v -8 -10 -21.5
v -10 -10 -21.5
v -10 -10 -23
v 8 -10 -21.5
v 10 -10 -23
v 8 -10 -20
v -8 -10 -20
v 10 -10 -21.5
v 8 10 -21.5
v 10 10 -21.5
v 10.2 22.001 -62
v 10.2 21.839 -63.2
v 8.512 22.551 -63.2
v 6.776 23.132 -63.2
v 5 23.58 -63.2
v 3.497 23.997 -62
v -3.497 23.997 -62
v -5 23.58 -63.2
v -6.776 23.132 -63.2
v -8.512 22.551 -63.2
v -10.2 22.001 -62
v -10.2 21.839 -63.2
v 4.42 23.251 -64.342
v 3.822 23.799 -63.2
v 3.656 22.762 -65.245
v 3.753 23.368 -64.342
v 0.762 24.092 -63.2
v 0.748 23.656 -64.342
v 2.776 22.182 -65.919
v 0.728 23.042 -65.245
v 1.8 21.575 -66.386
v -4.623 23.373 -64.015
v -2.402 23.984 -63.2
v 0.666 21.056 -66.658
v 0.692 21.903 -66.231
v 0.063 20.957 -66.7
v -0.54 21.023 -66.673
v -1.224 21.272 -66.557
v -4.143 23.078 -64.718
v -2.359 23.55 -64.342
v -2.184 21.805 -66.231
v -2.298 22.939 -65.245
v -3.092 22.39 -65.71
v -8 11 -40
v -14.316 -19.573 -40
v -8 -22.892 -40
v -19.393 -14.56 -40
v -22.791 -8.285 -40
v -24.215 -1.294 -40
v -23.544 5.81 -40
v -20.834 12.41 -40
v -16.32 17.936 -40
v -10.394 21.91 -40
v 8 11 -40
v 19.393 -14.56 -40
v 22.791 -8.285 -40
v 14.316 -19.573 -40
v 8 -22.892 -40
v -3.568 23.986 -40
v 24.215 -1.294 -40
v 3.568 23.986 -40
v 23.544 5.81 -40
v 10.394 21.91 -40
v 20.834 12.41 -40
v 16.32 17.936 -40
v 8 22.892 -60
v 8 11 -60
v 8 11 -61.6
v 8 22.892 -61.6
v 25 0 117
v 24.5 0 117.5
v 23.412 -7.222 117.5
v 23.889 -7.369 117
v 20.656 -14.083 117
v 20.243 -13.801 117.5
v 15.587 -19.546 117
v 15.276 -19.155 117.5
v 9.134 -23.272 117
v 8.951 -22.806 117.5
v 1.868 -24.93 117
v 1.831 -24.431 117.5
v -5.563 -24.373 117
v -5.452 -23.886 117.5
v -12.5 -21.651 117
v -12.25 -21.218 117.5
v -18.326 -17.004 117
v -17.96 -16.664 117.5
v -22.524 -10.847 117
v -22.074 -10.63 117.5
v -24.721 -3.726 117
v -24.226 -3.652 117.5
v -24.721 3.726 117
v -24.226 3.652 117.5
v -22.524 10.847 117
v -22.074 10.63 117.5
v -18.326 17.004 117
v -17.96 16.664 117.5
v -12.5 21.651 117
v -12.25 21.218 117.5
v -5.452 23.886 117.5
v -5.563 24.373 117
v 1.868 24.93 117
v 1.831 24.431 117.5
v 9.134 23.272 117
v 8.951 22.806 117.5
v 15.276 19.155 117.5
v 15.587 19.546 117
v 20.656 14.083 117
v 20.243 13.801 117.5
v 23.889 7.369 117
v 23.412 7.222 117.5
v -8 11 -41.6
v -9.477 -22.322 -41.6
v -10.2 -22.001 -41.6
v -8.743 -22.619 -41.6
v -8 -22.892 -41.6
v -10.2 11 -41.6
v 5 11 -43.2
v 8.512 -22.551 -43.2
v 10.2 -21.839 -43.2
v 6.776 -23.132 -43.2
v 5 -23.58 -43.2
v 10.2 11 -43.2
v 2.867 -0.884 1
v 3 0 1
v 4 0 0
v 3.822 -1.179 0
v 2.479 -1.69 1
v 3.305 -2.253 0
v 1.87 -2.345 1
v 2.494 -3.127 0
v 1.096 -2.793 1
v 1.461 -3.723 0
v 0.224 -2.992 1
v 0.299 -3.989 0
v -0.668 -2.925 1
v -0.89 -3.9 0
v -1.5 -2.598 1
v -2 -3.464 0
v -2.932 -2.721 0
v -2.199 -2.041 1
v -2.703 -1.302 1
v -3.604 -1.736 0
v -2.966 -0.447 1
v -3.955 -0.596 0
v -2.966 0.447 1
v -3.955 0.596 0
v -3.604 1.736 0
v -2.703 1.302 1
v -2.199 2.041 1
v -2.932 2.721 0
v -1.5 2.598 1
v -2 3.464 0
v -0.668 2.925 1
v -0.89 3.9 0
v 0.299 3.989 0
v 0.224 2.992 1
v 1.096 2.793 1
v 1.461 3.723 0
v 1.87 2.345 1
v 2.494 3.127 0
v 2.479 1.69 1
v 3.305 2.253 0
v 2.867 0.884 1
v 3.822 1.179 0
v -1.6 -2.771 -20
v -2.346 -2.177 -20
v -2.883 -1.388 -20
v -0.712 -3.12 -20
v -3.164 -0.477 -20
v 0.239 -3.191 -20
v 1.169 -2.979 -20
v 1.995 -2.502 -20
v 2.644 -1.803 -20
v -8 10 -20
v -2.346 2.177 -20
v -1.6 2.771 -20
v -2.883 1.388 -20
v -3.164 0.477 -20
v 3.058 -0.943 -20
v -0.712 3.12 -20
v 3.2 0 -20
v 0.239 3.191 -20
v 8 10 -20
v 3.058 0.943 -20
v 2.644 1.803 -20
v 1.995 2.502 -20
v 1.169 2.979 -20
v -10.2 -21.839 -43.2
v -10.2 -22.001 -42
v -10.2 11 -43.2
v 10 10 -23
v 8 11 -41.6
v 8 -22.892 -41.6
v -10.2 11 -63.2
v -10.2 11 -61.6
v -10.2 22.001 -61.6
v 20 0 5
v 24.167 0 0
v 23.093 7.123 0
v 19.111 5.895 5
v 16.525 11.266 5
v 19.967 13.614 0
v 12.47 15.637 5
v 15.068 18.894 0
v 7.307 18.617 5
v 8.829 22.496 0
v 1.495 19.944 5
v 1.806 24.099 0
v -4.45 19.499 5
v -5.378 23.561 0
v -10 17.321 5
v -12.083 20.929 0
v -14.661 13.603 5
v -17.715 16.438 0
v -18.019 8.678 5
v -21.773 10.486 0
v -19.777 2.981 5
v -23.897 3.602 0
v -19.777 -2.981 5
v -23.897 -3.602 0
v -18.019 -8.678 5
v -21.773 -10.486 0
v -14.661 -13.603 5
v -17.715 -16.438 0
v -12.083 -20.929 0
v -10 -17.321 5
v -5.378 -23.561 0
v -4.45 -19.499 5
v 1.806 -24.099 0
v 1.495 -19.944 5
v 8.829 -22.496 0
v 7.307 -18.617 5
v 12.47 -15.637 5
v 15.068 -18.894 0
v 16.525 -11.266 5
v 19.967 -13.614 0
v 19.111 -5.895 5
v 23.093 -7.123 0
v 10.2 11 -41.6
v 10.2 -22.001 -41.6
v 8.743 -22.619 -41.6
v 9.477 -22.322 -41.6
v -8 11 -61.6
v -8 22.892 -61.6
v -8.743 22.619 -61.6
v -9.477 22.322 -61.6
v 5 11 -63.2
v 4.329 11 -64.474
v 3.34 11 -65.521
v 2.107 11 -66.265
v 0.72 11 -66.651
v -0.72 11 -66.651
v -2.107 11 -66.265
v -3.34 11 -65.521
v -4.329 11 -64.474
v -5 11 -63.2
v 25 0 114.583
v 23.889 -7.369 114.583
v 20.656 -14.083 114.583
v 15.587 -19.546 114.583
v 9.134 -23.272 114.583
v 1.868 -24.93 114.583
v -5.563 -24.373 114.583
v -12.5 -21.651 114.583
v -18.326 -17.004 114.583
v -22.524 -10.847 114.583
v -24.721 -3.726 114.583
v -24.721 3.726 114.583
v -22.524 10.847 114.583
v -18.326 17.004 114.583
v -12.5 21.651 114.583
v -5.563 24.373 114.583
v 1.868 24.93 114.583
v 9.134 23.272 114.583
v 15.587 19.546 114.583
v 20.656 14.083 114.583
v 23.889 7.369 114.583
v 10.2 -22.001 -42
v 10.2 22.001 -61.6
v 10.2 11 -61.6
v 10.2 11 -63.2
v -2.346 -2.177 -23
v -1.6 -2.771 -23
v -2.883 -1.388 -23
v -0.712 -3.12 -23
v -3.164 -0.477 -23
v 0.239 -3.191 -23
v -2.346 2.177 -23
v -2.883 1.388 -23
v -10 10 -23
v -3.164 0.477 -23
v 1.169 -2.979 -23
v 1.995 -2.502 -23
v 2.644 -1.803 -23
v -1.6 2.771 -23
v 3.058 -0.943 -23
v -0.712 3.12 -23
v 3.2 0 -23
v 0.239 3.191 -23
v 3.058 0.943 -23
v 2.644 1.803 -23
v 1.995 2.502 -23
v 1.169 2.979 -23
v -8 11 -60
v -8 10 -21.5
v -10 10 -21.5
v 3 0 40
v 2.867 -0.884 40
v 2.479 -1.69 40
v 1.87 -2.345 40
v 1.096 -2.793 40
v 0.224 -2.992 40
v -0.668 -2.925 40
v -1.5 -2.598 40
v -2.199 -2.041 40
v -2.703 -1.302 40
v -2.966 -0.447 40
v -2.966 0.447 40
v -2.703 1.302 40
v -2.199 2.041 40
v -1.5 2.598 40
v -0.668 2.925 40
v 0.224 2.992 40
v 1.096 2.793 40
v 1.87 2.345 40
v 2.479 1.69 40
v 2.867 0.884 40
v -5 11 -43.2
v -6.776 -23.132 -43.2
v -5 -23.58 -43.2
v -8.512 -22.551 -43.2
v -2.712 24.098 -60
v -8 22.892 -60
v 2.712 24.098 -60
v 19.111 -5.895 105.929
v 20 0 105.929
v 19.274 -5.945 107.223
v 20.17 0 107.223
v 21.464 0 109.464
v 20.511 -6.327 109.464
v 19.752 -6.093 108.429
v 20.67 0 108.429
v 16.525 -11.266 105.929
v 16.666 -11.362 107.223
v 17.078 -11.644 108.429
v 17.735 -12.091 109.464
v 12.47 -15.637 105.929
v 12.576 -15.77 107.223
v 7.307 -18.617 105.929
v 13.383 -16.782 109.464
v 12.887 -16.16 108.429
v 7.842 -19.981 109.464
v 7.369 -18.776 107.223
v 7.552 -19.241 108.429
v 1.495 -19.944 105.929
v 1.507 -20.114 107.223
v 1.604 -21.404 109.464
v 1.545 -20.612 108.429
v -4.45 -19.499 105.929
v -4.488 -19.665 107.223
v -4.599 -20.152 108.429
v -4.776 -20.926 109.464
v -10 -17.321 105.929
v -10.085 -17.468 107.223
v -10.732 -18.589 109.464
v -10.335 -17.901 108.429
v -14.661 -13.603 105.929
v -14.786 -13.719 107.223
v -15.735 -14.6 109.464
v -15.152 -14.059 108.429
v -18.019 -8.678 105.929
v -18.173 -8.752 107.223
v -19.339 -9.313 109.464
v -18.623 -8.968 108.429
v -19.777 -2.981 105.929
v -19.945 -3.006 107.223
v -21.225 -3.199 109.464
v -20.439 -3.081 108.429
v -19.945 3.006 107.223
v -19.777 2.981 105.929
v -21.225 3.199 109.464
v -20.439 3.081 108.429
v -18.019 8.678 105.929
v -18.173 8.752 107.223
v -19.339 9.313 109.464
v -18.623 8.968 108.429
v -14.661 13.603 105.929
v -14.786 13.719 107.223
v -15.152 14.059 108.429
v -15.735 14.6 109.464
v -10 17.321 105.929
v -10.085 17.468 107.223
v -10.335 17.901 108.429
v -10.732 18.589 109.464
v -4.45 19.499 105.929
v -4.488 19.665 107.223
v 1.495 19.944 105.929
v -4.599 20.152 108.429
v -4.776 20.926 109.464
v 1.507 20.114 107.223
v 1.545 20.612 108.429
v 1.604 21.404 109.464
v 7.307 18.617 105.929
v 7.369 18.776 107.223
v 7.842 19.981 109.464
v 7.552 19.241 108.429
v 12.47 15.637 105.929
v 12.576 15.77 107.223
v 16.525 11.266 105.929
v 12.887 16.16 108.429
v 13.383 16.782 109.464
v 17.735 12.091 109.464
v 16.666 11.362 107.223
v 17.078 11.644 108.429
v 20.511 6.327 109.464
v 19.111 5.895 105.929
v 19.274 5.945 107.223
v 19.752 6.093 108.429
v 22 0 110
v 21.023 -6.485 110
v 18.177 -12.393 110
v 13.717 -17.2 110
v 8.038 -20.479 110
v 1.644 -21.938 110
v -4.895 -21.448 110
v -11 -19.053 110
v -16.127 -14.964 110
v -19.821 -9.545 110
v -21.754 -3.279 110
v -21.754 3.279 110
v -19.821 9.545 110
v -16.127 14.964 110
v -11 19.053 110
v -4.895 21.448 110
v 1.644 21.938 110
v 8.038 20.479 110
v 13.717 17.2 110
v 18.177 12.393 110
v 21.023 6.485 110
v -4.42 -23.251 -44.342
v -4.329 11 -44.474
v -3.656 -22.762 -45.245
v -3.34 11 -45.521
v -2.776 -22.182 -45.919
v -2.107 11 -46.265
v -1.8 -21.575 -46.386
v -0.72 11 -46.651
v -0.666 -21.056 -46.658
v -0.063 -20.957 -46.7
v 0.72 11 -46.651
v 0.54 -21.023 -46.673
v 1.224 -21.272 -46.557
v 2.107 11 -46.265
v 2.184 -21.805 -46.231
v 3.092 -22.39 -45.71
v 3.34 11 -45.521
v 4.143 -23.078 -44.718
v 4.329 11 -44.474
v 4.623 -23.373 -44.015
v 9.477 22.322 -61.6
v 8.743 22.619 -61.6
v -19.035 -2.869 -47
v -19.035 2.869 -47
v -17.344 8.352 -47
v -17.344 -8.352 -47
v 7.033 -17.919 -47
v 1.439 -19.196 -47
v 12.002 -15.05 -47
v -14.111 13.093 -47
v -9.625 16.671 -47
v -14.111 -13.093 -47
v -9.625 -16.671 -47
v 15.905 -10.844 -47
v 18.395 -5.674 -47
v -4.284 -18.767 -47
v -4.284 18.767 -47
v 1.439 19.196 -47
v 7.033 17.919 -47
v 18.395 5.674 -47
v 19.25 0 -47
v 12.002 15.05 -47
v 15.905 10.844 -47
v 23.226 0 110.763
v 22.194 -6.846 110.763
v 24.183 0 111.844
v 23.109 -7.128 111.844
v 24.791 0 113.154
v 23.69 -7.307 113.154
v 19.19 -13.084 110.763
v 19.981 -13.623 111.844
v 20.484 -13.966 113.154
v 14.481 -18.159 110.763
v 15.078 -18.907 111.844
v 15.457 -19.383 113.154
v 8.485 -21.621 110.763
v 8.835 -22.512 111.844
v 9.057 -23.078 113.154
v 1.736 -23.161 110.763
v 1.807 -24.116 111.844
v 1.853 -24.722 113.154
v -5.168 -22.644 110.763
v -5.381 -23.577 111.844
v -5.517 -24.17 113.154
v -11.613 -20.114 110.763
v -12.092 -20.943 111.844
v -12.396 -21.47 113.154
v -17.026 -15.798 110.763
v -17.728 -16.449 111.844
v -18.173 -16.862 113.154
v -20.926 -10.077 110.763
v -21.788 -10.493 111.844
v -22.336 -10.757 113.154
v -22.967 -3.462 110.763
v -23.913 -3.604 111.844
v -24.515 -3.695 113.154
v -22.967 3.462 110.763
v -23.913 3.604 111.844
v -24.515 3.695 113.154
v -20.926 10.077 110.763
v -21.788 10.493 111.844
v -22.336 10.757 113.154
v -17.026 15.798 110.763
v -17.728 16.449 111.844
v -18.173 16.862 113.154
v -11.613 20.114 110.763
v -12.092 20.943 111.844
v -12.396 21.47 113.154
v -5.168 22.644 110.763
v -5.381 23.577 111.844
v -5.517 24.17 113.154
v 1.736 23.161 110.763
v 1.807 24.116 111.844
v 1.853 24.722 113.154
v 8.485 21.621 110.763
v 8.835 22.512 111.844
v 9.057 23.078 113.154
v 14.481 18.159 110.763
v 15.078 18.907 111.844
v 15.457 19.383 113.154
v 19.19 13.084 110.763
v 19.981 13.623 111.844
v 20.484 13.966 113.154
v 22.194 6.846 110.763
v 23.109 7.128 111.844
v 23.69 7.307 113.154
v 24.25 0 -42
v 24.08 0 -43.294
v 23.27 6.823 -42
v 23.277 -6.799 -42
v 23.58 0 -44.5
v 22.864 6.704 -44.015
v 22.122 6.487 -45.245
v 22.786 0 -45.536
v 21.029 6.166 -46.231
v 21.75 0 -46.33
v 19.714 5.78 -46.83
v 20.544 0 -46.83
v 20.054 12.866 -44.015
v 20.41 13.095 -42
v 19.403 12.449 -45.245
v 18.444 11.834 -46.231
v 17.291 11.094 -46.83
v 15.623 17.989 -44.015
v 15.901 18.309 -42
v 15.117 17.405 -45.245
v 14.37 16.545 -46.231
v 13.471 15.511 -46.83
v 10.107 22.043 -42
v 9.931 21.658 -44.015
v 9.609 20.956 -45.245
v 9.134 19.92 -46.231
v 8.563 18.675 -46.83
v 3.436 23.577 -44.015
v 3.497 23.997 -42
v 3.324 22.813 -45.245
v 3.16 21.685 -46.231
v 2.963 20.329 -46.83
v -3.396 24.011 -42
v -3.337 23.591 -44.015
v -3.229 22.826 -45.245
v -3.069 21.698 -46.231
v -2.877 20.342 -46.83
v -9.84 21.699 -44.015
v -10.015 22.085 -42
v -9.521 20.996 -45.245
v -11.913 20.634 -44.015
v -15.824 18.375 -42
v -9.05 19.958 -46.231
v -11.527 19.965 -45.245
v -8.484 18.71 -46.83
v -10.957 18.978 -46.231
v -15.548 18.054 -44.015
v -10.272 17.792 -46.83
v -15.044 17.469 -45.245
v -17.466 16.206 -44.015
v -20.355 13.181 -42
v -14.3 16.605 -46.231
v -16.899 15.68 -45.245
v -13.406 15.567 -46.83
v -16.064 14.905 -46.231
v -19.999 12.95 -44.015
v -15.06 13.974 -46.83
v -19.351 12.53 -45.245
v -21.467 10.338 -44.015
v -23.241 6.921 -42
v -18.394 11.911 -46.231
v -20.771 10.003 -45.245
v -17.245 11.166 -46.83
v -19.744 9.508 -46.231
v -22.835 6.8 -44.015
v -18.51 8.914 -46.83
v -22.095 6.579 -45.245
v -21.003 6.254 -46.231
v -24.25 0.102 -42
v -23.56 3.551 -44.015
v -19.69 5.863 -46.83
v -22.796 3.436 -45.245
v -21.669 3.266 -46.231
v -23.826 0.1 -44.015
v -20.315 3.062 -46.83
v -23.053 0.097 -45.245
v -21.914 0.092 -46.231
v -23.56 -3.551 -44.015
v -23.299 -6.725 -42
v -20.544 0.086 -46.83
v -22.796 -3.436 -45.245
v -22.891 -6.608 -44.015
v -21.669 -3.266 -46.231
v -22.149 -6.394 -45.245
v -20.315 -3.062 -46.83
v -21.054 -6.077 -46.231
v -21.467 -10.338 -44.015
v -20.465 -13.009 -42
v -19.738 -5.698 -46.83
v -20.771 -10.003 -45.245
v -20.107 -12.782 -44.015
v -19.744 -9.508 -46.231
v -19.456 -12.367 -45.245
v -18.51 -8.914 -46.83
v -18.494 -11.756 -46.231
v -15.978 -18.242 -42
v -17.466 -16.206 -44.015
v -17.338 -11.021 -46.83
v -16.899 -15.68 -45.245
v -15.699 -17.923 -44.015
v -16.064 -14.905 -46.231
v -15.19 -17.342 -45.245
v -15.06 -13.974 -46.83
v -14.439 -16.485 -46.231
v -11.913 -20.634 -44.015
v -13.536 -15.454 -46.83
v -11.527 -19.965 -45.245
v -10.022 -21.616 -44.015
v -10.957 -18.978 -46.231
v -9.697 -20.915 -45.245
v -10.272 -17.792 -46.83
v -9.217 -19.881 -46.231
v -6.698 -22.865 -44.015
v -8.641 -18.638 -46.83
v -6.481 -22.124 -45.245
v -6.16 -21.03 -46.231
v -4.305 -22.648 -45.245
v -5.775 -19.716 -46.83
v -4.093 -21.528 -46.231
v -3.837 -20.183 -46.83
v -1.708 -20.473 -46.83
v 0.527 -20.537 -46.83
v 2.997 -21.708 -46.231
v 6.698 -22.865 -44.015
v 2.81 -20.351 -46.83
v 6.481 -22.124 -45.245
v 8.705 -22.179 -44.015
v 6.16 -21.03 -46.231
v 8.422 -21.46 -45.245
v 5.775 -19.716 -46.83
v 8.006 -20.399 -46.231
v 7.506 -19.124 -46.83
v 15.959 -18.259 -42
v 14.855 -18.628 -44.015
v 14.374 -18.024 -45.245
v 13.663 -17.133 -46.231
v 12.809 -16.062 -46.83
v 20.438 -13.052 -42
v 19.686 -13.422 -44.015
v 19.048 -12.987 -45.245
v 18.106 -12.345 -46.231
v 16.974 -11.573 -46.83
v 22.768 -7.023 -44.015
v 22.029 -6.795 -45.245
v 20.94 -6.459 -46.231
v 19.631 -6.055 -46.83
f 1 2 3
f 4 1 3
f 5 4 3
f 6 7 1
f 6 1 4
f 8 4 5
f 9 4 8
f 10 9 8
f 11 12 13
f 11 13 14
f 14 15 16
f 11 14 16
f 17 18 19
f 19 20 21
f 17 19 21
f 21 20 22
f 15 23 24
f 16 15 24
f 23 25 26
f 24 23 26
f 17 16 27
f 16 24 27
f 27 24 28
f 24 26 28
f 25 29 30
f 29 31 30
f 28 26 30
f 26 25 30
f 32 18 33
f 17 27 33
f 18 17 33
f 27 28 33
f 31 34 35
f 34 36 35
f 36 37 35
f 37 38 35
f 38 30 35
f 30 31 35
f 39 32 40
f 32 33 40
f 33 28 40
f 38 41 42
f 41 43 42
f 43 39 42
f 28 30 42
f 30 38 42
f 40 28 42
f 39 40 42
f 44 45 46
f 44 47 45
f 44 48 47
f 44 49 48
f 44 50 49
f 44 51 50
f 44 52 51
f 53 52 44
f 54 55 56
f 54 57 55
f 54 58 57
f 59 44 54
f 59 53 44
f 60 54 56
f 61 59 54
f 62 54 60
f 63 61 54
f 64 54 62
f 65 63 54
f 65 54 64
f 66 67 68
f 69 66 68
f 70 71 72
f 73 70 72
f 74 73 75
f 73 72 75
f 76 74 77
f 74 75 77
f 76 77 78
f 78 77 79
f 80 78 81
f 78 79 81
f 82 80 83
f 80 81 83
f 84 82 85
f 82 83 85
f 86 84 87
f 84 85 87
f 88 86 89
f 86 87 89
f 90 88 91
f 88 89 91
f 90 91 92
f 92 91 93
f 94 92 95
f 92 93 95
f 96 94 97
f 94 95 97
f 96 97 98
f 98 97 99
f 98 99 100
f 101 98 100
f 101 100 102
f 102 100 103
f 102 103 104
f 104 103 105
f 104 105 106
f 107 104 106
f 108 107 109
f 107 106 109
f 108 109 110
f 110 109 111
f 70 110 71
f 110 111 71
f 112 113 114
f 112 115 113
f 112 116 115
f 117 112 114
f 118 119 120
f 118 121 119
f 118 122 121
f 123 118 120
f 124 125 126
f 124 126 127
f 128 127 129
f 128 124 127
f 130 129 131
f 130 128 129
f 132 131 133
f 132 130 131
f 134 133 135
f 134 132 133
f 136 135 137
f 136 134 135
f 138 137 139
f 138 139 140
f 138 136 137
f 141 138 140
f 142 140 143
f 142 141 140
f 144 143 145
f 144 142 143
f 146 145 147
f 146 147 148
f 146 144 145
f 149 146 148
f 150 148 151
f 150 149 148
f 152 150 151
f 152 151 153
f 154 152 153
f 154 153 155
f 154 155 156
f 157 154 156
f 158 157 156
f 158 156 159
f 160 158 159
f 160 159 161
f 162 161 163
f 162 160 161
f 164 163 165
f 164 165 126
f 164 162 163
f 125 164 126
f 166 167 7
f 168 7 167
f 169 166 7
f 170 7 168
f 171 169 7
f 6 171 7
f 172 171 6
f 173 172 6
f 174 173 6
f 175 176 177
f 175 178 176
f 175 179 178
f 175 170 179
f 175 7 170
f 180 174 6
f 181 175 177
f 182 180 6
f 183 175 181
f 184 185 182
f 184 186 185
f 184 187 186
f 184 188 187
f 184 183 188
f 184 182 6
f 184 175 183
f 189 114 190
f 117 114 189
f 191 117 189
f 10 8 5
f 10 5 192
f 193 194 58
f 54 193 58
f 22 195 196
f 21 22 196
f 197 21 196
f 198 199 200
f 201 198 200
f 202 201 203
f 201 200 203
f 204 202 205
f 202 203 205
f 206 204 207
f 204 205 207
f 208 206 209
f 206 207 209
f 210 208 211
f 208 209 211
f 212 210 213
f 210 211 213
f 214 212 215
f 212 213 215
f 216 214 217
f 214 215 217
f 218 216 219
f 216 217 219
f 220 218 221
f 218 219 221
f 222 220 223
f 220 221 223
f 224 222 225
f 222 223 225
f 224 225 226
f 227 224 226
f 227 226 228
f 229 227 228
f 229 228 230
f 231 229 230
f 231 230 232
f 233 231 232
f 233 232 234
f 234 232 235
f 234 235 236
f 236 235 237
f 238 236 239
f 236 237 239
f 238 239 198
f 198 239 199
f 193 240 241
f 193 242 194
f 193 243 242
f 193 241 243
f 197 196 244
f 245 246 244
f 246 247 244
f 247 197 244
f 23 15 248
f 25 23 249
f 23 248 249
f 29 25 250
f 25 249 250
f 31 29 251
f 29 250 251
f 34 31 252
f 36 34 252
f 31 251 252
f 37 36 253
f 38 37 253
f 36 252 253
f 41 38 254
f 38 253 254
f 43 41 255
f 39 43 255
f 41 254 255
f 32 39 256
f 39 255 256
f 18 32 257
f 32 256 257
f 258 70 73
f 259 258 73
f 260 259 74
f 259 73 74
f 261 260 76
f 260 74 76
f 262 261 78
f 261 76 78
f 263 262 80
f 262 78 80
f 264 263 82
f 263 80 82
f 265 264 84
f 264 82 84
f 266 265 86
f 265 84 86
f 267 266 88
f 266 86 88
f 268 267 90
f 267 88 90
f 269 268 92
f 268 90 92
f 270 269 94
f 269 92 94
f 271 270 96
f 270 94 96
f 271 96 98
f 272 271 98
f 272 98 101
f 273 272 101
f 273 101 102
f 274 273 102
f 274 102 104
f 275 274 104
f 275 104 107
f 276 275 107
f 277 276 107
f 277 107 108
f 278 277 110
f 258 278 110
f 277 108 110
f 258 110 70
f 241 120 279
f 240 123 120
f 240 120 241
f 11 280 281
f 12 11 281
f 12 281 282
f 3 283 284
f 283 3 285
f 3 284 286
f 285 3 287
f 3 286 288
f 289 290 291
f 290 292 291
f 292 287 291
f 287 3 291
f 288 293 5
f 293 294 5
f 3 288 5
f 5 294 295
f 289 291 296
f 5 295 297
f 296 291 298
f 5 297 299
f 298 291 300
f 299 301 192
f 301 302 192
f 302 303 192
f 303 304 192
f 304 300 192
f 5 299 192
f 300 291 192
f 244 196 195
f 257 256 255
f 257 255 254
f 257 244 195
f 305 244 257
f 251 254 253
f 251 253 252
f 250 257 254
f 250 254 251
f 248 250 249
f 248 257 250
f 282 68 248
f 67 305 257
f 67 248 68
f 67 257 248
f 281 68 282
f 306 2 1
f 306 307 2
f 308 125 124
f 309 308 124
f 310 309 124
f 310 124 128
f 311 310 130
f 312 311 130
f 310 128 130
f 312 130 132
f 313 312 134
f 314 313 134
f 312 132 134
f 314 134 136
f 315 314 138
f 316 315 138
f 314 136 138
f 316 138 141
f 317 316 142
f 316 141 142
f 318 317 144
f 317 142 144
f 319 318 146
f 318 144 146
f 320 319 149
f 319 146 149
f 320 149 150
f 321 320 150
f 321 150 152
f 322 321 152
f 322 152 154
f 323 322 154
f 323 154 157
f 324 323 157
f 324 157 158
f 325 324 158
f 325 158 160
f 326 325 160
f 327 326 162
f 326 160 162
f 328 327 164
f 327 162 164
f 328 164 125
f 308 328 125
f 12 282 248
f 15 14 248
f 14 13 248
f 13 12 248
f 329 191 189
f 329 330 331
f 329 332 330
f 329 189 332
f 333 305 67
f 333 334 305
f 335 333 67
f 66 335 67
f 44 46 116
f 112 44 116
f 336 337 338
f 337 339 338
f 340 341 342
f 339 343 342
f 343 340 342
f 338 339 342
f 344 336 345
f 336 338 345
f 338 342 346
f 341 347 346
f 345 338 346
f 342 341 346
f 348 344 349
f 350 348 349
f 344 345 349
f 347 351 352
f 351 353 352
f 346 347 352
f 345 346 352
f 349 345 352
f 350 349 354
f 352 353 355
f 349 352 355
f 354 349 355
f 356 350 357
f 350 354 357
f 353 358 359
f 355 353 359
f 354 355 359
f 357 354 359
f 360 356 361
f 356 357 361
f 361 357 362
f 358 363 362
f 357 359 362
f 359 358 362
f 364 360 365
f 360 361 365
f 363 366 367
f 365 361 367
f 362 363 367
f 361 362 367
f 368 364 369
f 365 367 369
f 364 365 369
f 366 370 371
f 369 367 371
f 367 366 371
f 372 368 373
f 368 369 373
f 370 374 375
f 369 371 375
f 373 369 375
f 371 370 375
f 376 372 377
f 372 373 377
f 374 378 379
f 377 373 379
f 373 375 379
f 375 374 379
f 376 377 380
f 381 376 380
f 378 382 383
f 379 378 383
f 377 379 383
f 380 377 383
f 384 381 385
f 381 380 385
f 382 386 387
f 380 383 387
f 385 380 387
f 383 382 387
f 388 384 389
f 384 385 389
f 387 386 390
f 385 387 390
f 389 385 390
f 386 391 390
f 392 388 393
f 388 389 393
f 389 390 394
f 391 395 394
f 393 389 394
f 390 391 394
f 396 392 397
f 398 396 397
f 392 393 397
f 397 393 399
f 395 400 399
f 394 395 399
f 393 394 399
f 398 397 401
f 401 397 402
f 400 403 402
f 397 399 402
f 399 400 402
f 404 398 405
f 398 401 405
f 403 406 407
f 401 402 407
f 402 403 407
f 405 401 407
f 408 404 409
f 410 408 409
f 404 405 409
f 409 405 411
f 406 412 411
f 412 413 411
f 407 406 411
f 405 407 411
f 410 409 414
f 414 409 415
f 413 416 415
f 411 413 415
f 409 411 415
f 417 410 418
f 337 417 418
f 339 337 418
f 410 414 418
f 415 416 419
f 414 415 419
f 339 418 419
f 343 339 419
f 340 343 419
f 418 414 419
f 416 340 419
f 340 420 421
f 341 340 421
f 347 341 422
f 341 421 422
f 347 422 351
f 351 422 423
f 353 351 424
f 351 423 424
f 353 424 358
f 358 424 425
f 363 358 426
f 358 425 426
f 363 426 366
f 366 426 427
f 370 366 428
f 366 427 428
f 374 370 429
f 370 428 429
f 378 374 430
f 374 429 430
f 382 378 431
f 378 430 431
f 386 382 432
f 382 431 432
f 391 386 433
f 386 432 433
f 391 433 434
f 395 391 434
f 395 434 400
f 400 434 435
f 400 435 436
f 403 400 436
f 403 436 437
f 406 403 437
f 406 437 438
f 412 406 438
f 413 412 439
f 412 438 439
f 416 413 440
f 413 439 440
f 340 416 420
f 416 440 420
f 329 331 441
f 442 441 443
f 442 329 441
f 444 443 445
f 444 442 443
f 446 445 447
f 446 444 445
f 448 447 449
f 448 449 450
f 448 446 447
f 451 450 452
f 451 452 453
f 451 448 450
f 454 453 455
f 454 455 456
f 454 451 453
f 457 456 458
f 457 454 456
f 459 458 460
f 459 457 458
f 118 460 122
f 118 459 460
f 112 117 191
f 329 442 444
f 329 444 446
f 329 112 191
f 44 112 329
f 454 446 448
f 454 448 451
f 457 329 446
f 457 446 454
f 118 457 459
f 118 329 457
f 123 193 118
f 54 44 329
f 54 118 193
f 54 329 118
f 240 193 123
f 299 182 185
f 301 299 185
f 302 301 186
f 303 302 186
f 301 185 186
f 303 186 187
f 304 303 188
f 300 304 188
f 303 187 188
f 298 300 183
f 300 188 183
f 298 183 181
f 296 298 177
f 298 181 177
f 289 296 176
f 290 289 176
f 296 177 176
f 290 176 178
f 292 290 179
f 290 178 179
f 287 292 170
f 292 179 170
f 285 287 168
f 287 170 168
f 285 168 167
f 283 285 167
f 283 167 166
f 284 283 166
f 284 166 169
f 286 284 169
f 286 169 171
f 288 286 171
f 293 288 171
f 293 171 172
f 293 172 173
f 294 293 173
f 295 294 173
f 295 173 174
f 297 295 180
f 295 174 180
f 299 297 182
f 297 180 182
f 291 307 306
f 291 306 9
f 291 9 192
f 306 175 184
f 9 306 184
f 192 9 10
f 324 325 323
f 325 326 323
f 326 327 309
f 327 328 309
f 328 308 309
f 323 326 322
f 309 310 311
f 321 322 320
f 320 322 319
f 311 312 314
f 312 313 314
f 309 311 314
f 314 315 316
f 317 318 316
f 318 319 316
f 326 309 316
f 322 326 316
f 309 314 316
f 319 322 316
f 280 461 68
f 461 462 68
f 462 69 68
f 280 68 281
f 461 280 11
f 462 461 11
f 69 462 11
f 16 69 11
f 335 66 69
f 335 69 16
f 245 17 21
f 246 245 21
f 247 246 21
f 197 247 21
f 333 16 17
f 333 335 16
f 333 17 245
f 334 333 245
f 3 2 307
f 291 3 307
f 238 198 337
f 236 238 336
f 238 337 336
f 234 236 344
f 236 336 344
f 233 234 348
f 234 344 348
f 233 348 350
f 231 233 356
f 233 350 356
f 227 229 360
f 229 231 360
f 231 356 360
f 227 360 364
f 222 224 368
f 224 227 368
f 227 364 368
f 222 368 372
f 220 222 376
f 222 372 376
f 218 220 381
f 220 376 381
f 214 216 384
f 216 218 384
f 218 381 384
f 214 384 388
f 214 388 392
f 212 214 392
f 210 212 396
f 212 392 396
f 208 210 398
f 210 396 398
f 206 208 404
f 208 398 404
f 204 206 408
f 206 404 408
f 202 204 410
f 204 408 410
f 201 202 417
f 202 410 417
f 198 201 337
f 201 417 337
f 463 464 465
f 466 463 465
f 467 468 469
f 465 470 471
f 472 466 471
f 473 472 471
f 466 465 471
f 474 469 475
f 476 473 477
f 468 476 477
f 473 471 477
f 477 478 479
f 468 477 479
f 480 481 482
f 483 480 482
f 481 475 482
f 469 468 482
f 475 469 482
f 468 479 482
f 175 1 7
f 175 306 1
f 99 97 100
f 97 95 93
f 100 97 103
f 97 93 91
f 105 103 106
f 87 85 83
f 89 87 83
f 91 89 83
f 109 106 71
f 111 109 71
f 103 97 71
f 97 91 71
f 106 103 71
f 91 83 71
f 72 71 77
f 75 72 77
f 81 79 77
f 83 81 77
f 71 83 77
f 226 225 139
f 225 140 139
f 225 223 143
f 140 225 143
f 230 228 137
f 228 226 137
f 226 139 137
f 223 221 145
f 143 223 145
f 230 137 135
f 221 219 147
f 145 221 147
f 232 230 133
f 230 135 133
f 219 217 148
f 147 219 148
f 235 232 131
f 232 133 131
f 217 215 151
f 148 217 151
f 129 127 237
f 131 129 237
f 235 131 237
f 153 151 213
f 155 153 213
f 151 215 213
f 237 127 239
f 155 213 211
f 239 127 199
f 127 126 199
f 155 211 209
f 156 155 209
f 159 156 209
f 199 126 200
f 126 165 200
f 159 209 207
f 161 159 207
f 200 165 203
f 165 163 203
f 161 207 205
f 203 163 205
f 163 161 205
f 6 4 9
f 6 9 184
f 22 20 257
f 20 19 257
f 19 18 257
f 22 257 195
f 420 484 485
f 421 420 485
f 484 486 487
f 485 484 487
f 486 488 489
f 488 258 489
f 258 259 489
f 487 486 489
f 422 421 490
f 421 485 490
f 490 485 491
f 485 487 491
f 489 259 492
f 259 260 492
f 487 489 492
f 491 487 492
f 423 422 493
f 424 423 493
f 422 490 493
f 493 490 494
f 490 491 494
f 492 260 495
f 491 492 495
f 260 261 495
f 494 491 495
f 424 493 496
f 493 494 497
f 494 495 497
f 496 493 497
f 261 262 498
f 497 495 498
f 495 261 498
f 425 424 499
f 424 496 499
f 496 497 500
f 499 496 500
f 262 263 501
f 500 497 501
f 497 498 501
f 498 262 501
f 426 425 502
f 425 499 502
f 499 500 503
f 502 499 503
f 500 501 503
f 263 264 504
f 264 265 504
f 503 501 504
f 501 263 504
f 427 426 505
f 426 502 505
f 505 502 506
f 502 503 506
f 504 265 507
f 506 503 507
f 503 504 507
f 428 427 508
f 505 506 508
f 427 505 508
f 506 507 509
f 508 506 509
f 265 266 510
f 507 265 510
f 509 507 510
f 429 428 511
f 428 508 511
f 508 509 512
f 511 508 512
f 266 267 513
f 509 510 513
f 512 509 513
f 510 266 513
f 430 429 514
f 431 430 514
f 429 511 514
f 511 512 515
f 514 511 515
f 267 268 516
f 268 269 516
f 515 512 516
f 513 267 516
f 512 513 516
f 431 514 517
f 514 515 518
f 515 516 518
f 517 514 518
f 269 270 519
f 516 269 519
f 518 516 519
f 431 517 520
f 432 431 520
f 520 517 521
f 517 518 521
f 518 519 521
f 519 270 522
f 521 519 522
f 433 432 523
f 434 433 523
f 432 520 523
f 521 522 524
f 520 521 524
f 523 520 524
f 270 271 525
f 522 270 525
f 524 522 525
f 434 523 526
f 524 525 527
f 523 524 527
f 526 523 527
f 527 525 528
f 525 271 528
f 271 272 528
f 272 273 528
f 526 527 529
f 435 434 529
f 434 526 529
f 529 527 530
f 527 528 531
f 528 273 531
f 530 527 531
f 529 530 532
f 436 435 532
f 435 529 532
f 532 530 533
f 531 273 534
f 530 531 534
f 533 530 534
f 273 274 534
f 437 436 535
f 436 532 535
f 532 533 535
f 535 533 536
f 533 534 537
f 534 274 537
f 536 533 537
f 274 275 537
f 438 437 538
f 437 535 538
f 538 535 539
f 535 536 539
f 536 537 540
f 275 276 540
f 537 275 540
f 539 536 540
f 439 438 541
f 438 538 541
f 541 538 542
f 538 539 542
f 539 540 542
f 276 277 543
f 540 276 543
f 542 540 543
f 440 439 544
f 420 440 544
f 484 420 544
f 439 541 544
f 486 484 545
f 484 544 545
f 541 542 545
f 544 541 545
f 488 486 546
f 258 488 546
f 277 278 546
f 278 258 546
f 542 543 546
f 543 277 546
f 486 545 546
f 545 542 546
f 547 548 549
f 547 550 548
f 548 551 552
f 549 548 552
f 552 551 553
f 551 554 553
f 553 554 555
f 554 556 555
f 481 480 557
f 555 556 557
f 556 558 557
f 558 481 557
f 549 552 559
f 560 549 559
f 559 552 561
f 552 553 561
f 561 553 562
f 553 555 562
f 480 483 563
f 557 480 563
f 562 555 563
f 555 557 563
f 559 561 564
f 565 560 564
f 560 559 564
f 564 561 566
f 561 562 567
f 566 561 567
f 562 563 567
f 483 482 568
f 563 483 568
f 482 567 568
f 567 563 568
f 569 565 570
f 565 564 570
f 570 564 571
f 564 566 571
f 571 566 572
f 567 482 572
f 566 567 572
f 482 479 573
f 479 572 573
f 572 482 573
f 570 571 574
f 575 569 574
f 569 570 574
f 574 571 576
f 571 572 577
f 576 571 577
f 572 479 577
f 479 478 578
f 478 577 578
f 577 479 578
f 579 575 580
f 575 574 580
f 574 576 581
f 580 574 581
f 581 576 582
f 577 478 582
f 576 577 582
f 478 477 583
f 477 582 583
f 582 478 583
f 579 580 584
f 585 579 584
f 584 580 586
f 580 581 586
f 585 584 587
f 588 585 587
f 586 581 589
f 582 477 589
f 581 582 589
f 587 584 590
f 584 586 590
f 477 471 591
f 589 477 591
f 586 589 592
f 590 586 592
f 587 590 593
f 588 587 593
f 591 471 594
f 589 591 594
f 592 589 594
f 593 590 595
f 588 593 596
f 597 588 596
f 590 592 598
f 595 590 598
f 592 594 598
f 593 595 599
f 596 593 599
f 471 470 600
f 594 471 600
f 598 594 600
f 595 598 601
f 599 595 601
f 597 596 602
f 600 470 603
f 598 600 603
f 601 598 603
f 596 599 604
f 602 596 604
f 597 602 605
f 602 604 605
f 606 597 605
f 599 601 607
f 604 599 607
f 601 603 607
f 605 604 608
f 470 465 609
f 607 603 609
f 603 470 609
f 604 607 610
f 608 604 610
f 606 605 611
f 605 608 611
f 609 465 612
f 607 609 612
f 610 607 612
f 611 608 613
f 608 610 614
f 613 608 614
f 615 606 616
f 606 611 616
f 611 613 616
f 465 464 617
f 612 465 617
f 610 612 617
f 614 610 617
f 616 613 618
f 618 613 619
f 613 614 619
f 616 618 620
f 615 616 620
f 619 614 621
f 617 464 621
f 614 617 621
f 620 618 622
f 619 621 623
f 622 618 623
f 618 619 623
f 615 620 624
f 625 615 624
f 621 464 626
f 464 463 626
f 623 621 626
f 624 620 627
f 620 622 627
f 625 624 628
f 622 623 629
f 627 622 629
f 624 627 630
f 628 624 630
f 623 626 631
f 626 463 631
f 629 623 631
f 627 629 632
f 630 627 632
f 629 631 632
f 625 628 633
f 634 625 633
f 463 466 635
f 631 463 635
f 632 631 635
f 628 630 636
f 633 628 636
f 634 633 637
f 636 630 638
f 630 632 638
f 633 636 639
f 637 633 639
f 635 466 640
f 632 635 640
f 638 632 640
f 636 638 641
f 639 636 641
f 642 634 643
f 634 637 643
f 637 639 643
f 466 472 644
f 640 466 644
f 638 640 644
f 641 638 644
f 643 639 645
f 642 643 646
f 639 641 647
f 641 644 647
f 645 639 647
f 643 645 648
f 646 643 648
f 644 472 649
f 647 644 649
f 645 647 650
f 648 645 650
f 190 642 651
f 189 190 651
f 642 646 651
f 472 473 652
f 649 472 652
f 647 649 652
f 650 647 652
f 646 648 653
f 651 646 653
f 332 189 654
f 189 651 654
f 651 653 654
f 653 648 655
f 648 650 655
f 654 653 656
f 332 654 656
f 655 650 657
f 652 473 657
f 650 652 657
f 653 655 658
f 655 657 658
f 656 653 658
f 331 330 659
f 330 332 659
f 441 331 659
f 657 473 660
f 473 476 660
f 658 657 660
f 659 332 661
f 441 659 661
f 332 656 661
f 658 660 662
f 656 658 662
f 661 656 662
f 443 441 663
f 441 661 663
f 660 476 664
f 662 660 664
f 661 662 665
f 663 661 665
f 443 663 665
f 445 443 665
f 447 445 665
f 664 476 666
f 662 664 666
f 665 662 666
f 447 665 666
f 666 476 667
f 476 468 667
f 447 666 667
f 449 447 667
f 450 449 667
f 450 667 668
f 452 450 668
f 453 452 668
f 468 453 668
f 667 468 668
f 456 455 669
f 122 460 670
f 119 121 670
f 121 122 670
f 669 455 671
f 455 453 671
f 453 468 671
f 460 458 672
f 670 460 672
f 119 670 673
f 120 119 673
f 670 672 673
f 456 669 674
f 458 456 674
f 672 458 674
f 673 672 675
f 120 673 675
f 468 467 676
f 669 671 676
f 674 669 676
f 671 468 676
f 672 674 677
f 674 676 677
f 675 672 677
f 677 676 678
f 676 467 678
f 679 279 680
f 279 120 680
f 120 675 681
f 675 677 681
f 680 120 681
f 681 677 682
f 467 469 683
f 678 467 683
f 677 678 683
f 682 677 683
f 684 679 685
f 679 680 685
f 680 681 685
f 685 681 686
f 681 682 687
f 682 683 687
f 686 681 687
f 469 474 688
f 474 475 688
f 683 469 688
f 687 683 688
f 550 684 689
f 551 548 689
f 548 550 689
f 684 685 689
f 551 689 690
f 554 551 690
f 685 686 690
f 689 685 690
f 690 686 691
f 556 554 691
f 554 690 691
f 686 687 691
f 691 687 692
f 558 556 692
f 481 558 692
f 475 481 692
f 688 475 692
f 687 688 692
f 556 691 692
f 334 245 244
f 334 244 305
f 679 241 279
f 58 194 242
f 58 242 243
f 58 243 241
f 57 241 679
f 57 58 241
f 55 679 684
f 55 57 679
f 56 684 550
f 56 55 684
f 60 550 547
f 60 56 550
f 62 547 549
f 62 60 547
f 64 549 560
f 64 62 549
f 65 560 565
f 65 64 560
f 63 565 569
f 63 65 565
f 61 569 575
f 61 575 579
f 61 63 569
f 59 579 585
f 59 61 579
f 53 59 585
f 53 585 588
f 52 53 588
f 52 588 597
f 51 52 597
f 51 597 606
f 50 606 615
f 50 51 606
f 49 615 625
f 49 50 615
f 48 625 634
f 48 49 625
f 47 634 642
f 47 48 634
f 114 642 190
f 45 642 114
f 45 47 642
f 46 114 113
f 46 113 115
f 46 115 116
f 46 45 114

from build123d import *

# Parameters (mm, degrees)
F2_SIZE     = 2
F4_SIZE     = 1
F5_SIZE     = 0.5
F6_R        = 25
F6_R_2      = 20
F7_DEPTH    = 5
F8_S5_R     = 20
F8_T6_DEPTH = 37
F10_W       = 20
F10_H       = 20
F10_R       = 3.2
F11_DEPTH   = 3
F12_W       = 2
F12_H       = 1.5
F13_DEPTH   = 10
F15_R       = 24.25
F16_DEPTH   = 7
F17_R       = 5
F19_DEPTH   = 25
F20_DEPTH   = 11
F23_DEPTH   = 50


# Not quite as in the source:
# - a fillet or chamfer that OpenCascade refuses, or shapes differently, is made with other operations: its cross-section is extruded or revolved along the edge and cut away or added


with BuildPart() as f1:
    # F0 (on Front) → F1 (revolve)
    with BuildSketch(Plane.XZ):
        Polygon((3, 40), (3, 0), (20, 0), (20, 110), (25, 110), (25, 117.5), (0, 117.5), (0, 40), align=None)
    revolve(axis=Axis((0, 0, 78.75), (0, 0, -1)))

    # F2
    f2_edges = [f1.edges().sort_by_distance(p)[0] for p in [
        (-20, 0, 110),
    ]]
    chamfer(f2_edges, length=F2_SIZE)

    # F3: fillet of radius 5 on 2 edges, made by hand

    # F3_s1 → F3_t2 (revolve)
    with BuildSketch(Plane.XZ):
        with BuildLine():
            ThreePointArc((20, 105.9289321881), (20.3806023374, 107.84234935), (21.4644660941, 109.4644660941))
            Line((21.4644660941, 109.4644660941), (20, 108))
            Line((20, 108), (20, 105.9289321881))
        make_face()
    revolve(axis=Axis((0, 0, 108), (0, 0, -1)))

    # F3_s3 → F3_t4 (revolve, cut)
    with BuildSketch(Plane.XZ):
        with BuildLine():
            ThreePointArc((22, 110), (24.1833001327, 111.8439629074), (25, 114.582575695))
            Line((25, 114.582575695), (25, 110))
            Line((25, 110), (22, 110))
        make_face()
    revolve(axis=Axis((0, 0, 110), (0, 0, -1)), mode=Mode.SUBTRACT)

    # F4
    f4_edges = [f1.edges().sort_by_distance(p)[0] for p in [
        (-3, 0, 0),
    ]]
    chamfer(f4_edges, length=F4_SIZE)

    # F5
    f5_edges = [f1.edges().sort_by_distance(p)[0] for p in [
        (-25, 0, 117.5),
    ]]
    chamfer(f5_edges, length=F5_SIZE)

    # F6 (on Top) → F7 (join)
    with BuildSketch(Plane.XY):
        Circle(F6_R)
        Circle(F6_R_2, mode=Mode.SUBTRACT)
    extrude(amount=F7_DEPTH)

    # F8: chamfer of 5 x 6 on 1 edges, made by hand


with BuildPart() as f8_tool2:
    # F8_s3 → F8_t4 (revolve)
    with BuildSketch(Plane.XZ):
        Polygon((20, 5), (25, -1), (25, 5), align=None)
    revolve(axis=Axis((0, 0, 5), (0, 0, 1)))

    # F8_s5 → F8_t6 (cut, symmetric)
    with BuildSketch(Plane.XY.offset(2)):
        Circle(F8_S5_R)
    extrude(amount=F8_T6_DEPTH, both=True, mode=Mode.SUBTRACT)


with BuildPart() as f1_1:
    add(f1.part)

    # F8_t1: cut F8_tool2
    add(f8_tool2.part, mode=Mode.SUBTRACT)


with BuildPart() as f11:
    # F10 (on offset) → F11 (new body)
    with BuildSketch(Plane.XY.offset(-20)):
        Rectangle(F10_W, F10_H)
        Circle(F10_R, mode=Mode.SUBTRACT)
    extrude(amount=-F11_DEPTH)

    # F12 (on Front) → F13 (cut, symmetric)
    with BuildSketch(Plane.XZ):
        with Locations((-9, -20.75)):
            Rectangle(F12_W, F12_H)
        with Locations((9, -20.75)):
            Rectangle(F12_W, F12_H)
    extrude(amount=F13_DEPTH, both=True, mode=Mode.SUBTRACT)


with BuildPart() as f16:
    # F15 (on offset) → F16 (new body)
    with BuildSketch(Plane.XY.offset(-40)):
        Circle(F15_R)
    extrude(amount=-F16_DEPTH)

    # F17
    f17_edges = [f16.edges().sort_by_distance(p)[0] for p in [
        (-24.25, 0, -47),
    ]]
    fillet(f17_edges, radius=F17_R)

    # F18 (on Front) → F19 (cut)
    with BuildSketch(Plane.XZ):
        Polygon((0, -43.2), (0, -40), (-8, -40), (-8, -41.6), (-10.2, -41.6), (-10.2, -43.2), (-5, -43.2), align=None)
        Polygon((8, -40), (0, -40), (0, -43.2), (5, -43.2), (10.2, -43.2), (10.2, -41.6), (8, -41.6), align=None)
        with BuildLine():
            Line((5, -43.2), (0, -43.2))
            Line((0, -43.2), (-5, -43.2))
            ThreePointArc((-5, -43.2), (0, -46.7), (5, -43.2))
        make_face()
    extrude(amount=F19_DEPTH, mode=Mode.SUBTRACT)

    # F20 (cut): a face of the model
    f20_faces = [f16.faces().sort_by_distance(p)[0] for p in [
        (0, 0, -42.595240959),
    ]]
    extrude(f20_faces, amount=-F20_DEPTH, mode=Mode.SUBTRACT)


with BuildPart() as f21_1:
    # F21: copy of F16
    add(f16.part.moved(Location((0, 0, -20))))

    # F22 (on face) → F23 (cut, symmetric)
    with BuildSketch(Plane.XZ.offset(-11)):
        with BuildLine():
            Line((31.9885127246, -60), (8, -60))
            Line((8, -60), (8, -61.6))
            Line((8, -61.6), (10.2, -61.6))
            Line((10.2, -61.6), (10.2, -63.2))
            Line((10.2, -63.2), (5, -63.2))
            ThreePointArc((5, -63.2), (0, -66.7), (-5, -63.2))
            Line((-5, -63.2), (-10.2, -63.2))
            Line((-10.2, -63.2), (-10.2, -61.6))
            Line((-10.2, -61.6), (-8, -61.6))
            Line((-8, -61.6), (-8, -60))
            Line((-8, -60), (-32.2001688182, -60))
            Line((-32.2001688182, -60), (-32.2001688182, -71.0251182318))
            Line((-32.2001688182, -71.0251182318), (31.9885127246, -71.0251182318))
            Line((31.9885127246, -71.0251182318), (31.9885127246, -60))
        make_face()
    extrude(amount=F23_DEPTH, both=True, mode=Mode.SUBTRACT)


solid = Compound([f1_1.part, f11.part, f16.part, f21_1.part])
